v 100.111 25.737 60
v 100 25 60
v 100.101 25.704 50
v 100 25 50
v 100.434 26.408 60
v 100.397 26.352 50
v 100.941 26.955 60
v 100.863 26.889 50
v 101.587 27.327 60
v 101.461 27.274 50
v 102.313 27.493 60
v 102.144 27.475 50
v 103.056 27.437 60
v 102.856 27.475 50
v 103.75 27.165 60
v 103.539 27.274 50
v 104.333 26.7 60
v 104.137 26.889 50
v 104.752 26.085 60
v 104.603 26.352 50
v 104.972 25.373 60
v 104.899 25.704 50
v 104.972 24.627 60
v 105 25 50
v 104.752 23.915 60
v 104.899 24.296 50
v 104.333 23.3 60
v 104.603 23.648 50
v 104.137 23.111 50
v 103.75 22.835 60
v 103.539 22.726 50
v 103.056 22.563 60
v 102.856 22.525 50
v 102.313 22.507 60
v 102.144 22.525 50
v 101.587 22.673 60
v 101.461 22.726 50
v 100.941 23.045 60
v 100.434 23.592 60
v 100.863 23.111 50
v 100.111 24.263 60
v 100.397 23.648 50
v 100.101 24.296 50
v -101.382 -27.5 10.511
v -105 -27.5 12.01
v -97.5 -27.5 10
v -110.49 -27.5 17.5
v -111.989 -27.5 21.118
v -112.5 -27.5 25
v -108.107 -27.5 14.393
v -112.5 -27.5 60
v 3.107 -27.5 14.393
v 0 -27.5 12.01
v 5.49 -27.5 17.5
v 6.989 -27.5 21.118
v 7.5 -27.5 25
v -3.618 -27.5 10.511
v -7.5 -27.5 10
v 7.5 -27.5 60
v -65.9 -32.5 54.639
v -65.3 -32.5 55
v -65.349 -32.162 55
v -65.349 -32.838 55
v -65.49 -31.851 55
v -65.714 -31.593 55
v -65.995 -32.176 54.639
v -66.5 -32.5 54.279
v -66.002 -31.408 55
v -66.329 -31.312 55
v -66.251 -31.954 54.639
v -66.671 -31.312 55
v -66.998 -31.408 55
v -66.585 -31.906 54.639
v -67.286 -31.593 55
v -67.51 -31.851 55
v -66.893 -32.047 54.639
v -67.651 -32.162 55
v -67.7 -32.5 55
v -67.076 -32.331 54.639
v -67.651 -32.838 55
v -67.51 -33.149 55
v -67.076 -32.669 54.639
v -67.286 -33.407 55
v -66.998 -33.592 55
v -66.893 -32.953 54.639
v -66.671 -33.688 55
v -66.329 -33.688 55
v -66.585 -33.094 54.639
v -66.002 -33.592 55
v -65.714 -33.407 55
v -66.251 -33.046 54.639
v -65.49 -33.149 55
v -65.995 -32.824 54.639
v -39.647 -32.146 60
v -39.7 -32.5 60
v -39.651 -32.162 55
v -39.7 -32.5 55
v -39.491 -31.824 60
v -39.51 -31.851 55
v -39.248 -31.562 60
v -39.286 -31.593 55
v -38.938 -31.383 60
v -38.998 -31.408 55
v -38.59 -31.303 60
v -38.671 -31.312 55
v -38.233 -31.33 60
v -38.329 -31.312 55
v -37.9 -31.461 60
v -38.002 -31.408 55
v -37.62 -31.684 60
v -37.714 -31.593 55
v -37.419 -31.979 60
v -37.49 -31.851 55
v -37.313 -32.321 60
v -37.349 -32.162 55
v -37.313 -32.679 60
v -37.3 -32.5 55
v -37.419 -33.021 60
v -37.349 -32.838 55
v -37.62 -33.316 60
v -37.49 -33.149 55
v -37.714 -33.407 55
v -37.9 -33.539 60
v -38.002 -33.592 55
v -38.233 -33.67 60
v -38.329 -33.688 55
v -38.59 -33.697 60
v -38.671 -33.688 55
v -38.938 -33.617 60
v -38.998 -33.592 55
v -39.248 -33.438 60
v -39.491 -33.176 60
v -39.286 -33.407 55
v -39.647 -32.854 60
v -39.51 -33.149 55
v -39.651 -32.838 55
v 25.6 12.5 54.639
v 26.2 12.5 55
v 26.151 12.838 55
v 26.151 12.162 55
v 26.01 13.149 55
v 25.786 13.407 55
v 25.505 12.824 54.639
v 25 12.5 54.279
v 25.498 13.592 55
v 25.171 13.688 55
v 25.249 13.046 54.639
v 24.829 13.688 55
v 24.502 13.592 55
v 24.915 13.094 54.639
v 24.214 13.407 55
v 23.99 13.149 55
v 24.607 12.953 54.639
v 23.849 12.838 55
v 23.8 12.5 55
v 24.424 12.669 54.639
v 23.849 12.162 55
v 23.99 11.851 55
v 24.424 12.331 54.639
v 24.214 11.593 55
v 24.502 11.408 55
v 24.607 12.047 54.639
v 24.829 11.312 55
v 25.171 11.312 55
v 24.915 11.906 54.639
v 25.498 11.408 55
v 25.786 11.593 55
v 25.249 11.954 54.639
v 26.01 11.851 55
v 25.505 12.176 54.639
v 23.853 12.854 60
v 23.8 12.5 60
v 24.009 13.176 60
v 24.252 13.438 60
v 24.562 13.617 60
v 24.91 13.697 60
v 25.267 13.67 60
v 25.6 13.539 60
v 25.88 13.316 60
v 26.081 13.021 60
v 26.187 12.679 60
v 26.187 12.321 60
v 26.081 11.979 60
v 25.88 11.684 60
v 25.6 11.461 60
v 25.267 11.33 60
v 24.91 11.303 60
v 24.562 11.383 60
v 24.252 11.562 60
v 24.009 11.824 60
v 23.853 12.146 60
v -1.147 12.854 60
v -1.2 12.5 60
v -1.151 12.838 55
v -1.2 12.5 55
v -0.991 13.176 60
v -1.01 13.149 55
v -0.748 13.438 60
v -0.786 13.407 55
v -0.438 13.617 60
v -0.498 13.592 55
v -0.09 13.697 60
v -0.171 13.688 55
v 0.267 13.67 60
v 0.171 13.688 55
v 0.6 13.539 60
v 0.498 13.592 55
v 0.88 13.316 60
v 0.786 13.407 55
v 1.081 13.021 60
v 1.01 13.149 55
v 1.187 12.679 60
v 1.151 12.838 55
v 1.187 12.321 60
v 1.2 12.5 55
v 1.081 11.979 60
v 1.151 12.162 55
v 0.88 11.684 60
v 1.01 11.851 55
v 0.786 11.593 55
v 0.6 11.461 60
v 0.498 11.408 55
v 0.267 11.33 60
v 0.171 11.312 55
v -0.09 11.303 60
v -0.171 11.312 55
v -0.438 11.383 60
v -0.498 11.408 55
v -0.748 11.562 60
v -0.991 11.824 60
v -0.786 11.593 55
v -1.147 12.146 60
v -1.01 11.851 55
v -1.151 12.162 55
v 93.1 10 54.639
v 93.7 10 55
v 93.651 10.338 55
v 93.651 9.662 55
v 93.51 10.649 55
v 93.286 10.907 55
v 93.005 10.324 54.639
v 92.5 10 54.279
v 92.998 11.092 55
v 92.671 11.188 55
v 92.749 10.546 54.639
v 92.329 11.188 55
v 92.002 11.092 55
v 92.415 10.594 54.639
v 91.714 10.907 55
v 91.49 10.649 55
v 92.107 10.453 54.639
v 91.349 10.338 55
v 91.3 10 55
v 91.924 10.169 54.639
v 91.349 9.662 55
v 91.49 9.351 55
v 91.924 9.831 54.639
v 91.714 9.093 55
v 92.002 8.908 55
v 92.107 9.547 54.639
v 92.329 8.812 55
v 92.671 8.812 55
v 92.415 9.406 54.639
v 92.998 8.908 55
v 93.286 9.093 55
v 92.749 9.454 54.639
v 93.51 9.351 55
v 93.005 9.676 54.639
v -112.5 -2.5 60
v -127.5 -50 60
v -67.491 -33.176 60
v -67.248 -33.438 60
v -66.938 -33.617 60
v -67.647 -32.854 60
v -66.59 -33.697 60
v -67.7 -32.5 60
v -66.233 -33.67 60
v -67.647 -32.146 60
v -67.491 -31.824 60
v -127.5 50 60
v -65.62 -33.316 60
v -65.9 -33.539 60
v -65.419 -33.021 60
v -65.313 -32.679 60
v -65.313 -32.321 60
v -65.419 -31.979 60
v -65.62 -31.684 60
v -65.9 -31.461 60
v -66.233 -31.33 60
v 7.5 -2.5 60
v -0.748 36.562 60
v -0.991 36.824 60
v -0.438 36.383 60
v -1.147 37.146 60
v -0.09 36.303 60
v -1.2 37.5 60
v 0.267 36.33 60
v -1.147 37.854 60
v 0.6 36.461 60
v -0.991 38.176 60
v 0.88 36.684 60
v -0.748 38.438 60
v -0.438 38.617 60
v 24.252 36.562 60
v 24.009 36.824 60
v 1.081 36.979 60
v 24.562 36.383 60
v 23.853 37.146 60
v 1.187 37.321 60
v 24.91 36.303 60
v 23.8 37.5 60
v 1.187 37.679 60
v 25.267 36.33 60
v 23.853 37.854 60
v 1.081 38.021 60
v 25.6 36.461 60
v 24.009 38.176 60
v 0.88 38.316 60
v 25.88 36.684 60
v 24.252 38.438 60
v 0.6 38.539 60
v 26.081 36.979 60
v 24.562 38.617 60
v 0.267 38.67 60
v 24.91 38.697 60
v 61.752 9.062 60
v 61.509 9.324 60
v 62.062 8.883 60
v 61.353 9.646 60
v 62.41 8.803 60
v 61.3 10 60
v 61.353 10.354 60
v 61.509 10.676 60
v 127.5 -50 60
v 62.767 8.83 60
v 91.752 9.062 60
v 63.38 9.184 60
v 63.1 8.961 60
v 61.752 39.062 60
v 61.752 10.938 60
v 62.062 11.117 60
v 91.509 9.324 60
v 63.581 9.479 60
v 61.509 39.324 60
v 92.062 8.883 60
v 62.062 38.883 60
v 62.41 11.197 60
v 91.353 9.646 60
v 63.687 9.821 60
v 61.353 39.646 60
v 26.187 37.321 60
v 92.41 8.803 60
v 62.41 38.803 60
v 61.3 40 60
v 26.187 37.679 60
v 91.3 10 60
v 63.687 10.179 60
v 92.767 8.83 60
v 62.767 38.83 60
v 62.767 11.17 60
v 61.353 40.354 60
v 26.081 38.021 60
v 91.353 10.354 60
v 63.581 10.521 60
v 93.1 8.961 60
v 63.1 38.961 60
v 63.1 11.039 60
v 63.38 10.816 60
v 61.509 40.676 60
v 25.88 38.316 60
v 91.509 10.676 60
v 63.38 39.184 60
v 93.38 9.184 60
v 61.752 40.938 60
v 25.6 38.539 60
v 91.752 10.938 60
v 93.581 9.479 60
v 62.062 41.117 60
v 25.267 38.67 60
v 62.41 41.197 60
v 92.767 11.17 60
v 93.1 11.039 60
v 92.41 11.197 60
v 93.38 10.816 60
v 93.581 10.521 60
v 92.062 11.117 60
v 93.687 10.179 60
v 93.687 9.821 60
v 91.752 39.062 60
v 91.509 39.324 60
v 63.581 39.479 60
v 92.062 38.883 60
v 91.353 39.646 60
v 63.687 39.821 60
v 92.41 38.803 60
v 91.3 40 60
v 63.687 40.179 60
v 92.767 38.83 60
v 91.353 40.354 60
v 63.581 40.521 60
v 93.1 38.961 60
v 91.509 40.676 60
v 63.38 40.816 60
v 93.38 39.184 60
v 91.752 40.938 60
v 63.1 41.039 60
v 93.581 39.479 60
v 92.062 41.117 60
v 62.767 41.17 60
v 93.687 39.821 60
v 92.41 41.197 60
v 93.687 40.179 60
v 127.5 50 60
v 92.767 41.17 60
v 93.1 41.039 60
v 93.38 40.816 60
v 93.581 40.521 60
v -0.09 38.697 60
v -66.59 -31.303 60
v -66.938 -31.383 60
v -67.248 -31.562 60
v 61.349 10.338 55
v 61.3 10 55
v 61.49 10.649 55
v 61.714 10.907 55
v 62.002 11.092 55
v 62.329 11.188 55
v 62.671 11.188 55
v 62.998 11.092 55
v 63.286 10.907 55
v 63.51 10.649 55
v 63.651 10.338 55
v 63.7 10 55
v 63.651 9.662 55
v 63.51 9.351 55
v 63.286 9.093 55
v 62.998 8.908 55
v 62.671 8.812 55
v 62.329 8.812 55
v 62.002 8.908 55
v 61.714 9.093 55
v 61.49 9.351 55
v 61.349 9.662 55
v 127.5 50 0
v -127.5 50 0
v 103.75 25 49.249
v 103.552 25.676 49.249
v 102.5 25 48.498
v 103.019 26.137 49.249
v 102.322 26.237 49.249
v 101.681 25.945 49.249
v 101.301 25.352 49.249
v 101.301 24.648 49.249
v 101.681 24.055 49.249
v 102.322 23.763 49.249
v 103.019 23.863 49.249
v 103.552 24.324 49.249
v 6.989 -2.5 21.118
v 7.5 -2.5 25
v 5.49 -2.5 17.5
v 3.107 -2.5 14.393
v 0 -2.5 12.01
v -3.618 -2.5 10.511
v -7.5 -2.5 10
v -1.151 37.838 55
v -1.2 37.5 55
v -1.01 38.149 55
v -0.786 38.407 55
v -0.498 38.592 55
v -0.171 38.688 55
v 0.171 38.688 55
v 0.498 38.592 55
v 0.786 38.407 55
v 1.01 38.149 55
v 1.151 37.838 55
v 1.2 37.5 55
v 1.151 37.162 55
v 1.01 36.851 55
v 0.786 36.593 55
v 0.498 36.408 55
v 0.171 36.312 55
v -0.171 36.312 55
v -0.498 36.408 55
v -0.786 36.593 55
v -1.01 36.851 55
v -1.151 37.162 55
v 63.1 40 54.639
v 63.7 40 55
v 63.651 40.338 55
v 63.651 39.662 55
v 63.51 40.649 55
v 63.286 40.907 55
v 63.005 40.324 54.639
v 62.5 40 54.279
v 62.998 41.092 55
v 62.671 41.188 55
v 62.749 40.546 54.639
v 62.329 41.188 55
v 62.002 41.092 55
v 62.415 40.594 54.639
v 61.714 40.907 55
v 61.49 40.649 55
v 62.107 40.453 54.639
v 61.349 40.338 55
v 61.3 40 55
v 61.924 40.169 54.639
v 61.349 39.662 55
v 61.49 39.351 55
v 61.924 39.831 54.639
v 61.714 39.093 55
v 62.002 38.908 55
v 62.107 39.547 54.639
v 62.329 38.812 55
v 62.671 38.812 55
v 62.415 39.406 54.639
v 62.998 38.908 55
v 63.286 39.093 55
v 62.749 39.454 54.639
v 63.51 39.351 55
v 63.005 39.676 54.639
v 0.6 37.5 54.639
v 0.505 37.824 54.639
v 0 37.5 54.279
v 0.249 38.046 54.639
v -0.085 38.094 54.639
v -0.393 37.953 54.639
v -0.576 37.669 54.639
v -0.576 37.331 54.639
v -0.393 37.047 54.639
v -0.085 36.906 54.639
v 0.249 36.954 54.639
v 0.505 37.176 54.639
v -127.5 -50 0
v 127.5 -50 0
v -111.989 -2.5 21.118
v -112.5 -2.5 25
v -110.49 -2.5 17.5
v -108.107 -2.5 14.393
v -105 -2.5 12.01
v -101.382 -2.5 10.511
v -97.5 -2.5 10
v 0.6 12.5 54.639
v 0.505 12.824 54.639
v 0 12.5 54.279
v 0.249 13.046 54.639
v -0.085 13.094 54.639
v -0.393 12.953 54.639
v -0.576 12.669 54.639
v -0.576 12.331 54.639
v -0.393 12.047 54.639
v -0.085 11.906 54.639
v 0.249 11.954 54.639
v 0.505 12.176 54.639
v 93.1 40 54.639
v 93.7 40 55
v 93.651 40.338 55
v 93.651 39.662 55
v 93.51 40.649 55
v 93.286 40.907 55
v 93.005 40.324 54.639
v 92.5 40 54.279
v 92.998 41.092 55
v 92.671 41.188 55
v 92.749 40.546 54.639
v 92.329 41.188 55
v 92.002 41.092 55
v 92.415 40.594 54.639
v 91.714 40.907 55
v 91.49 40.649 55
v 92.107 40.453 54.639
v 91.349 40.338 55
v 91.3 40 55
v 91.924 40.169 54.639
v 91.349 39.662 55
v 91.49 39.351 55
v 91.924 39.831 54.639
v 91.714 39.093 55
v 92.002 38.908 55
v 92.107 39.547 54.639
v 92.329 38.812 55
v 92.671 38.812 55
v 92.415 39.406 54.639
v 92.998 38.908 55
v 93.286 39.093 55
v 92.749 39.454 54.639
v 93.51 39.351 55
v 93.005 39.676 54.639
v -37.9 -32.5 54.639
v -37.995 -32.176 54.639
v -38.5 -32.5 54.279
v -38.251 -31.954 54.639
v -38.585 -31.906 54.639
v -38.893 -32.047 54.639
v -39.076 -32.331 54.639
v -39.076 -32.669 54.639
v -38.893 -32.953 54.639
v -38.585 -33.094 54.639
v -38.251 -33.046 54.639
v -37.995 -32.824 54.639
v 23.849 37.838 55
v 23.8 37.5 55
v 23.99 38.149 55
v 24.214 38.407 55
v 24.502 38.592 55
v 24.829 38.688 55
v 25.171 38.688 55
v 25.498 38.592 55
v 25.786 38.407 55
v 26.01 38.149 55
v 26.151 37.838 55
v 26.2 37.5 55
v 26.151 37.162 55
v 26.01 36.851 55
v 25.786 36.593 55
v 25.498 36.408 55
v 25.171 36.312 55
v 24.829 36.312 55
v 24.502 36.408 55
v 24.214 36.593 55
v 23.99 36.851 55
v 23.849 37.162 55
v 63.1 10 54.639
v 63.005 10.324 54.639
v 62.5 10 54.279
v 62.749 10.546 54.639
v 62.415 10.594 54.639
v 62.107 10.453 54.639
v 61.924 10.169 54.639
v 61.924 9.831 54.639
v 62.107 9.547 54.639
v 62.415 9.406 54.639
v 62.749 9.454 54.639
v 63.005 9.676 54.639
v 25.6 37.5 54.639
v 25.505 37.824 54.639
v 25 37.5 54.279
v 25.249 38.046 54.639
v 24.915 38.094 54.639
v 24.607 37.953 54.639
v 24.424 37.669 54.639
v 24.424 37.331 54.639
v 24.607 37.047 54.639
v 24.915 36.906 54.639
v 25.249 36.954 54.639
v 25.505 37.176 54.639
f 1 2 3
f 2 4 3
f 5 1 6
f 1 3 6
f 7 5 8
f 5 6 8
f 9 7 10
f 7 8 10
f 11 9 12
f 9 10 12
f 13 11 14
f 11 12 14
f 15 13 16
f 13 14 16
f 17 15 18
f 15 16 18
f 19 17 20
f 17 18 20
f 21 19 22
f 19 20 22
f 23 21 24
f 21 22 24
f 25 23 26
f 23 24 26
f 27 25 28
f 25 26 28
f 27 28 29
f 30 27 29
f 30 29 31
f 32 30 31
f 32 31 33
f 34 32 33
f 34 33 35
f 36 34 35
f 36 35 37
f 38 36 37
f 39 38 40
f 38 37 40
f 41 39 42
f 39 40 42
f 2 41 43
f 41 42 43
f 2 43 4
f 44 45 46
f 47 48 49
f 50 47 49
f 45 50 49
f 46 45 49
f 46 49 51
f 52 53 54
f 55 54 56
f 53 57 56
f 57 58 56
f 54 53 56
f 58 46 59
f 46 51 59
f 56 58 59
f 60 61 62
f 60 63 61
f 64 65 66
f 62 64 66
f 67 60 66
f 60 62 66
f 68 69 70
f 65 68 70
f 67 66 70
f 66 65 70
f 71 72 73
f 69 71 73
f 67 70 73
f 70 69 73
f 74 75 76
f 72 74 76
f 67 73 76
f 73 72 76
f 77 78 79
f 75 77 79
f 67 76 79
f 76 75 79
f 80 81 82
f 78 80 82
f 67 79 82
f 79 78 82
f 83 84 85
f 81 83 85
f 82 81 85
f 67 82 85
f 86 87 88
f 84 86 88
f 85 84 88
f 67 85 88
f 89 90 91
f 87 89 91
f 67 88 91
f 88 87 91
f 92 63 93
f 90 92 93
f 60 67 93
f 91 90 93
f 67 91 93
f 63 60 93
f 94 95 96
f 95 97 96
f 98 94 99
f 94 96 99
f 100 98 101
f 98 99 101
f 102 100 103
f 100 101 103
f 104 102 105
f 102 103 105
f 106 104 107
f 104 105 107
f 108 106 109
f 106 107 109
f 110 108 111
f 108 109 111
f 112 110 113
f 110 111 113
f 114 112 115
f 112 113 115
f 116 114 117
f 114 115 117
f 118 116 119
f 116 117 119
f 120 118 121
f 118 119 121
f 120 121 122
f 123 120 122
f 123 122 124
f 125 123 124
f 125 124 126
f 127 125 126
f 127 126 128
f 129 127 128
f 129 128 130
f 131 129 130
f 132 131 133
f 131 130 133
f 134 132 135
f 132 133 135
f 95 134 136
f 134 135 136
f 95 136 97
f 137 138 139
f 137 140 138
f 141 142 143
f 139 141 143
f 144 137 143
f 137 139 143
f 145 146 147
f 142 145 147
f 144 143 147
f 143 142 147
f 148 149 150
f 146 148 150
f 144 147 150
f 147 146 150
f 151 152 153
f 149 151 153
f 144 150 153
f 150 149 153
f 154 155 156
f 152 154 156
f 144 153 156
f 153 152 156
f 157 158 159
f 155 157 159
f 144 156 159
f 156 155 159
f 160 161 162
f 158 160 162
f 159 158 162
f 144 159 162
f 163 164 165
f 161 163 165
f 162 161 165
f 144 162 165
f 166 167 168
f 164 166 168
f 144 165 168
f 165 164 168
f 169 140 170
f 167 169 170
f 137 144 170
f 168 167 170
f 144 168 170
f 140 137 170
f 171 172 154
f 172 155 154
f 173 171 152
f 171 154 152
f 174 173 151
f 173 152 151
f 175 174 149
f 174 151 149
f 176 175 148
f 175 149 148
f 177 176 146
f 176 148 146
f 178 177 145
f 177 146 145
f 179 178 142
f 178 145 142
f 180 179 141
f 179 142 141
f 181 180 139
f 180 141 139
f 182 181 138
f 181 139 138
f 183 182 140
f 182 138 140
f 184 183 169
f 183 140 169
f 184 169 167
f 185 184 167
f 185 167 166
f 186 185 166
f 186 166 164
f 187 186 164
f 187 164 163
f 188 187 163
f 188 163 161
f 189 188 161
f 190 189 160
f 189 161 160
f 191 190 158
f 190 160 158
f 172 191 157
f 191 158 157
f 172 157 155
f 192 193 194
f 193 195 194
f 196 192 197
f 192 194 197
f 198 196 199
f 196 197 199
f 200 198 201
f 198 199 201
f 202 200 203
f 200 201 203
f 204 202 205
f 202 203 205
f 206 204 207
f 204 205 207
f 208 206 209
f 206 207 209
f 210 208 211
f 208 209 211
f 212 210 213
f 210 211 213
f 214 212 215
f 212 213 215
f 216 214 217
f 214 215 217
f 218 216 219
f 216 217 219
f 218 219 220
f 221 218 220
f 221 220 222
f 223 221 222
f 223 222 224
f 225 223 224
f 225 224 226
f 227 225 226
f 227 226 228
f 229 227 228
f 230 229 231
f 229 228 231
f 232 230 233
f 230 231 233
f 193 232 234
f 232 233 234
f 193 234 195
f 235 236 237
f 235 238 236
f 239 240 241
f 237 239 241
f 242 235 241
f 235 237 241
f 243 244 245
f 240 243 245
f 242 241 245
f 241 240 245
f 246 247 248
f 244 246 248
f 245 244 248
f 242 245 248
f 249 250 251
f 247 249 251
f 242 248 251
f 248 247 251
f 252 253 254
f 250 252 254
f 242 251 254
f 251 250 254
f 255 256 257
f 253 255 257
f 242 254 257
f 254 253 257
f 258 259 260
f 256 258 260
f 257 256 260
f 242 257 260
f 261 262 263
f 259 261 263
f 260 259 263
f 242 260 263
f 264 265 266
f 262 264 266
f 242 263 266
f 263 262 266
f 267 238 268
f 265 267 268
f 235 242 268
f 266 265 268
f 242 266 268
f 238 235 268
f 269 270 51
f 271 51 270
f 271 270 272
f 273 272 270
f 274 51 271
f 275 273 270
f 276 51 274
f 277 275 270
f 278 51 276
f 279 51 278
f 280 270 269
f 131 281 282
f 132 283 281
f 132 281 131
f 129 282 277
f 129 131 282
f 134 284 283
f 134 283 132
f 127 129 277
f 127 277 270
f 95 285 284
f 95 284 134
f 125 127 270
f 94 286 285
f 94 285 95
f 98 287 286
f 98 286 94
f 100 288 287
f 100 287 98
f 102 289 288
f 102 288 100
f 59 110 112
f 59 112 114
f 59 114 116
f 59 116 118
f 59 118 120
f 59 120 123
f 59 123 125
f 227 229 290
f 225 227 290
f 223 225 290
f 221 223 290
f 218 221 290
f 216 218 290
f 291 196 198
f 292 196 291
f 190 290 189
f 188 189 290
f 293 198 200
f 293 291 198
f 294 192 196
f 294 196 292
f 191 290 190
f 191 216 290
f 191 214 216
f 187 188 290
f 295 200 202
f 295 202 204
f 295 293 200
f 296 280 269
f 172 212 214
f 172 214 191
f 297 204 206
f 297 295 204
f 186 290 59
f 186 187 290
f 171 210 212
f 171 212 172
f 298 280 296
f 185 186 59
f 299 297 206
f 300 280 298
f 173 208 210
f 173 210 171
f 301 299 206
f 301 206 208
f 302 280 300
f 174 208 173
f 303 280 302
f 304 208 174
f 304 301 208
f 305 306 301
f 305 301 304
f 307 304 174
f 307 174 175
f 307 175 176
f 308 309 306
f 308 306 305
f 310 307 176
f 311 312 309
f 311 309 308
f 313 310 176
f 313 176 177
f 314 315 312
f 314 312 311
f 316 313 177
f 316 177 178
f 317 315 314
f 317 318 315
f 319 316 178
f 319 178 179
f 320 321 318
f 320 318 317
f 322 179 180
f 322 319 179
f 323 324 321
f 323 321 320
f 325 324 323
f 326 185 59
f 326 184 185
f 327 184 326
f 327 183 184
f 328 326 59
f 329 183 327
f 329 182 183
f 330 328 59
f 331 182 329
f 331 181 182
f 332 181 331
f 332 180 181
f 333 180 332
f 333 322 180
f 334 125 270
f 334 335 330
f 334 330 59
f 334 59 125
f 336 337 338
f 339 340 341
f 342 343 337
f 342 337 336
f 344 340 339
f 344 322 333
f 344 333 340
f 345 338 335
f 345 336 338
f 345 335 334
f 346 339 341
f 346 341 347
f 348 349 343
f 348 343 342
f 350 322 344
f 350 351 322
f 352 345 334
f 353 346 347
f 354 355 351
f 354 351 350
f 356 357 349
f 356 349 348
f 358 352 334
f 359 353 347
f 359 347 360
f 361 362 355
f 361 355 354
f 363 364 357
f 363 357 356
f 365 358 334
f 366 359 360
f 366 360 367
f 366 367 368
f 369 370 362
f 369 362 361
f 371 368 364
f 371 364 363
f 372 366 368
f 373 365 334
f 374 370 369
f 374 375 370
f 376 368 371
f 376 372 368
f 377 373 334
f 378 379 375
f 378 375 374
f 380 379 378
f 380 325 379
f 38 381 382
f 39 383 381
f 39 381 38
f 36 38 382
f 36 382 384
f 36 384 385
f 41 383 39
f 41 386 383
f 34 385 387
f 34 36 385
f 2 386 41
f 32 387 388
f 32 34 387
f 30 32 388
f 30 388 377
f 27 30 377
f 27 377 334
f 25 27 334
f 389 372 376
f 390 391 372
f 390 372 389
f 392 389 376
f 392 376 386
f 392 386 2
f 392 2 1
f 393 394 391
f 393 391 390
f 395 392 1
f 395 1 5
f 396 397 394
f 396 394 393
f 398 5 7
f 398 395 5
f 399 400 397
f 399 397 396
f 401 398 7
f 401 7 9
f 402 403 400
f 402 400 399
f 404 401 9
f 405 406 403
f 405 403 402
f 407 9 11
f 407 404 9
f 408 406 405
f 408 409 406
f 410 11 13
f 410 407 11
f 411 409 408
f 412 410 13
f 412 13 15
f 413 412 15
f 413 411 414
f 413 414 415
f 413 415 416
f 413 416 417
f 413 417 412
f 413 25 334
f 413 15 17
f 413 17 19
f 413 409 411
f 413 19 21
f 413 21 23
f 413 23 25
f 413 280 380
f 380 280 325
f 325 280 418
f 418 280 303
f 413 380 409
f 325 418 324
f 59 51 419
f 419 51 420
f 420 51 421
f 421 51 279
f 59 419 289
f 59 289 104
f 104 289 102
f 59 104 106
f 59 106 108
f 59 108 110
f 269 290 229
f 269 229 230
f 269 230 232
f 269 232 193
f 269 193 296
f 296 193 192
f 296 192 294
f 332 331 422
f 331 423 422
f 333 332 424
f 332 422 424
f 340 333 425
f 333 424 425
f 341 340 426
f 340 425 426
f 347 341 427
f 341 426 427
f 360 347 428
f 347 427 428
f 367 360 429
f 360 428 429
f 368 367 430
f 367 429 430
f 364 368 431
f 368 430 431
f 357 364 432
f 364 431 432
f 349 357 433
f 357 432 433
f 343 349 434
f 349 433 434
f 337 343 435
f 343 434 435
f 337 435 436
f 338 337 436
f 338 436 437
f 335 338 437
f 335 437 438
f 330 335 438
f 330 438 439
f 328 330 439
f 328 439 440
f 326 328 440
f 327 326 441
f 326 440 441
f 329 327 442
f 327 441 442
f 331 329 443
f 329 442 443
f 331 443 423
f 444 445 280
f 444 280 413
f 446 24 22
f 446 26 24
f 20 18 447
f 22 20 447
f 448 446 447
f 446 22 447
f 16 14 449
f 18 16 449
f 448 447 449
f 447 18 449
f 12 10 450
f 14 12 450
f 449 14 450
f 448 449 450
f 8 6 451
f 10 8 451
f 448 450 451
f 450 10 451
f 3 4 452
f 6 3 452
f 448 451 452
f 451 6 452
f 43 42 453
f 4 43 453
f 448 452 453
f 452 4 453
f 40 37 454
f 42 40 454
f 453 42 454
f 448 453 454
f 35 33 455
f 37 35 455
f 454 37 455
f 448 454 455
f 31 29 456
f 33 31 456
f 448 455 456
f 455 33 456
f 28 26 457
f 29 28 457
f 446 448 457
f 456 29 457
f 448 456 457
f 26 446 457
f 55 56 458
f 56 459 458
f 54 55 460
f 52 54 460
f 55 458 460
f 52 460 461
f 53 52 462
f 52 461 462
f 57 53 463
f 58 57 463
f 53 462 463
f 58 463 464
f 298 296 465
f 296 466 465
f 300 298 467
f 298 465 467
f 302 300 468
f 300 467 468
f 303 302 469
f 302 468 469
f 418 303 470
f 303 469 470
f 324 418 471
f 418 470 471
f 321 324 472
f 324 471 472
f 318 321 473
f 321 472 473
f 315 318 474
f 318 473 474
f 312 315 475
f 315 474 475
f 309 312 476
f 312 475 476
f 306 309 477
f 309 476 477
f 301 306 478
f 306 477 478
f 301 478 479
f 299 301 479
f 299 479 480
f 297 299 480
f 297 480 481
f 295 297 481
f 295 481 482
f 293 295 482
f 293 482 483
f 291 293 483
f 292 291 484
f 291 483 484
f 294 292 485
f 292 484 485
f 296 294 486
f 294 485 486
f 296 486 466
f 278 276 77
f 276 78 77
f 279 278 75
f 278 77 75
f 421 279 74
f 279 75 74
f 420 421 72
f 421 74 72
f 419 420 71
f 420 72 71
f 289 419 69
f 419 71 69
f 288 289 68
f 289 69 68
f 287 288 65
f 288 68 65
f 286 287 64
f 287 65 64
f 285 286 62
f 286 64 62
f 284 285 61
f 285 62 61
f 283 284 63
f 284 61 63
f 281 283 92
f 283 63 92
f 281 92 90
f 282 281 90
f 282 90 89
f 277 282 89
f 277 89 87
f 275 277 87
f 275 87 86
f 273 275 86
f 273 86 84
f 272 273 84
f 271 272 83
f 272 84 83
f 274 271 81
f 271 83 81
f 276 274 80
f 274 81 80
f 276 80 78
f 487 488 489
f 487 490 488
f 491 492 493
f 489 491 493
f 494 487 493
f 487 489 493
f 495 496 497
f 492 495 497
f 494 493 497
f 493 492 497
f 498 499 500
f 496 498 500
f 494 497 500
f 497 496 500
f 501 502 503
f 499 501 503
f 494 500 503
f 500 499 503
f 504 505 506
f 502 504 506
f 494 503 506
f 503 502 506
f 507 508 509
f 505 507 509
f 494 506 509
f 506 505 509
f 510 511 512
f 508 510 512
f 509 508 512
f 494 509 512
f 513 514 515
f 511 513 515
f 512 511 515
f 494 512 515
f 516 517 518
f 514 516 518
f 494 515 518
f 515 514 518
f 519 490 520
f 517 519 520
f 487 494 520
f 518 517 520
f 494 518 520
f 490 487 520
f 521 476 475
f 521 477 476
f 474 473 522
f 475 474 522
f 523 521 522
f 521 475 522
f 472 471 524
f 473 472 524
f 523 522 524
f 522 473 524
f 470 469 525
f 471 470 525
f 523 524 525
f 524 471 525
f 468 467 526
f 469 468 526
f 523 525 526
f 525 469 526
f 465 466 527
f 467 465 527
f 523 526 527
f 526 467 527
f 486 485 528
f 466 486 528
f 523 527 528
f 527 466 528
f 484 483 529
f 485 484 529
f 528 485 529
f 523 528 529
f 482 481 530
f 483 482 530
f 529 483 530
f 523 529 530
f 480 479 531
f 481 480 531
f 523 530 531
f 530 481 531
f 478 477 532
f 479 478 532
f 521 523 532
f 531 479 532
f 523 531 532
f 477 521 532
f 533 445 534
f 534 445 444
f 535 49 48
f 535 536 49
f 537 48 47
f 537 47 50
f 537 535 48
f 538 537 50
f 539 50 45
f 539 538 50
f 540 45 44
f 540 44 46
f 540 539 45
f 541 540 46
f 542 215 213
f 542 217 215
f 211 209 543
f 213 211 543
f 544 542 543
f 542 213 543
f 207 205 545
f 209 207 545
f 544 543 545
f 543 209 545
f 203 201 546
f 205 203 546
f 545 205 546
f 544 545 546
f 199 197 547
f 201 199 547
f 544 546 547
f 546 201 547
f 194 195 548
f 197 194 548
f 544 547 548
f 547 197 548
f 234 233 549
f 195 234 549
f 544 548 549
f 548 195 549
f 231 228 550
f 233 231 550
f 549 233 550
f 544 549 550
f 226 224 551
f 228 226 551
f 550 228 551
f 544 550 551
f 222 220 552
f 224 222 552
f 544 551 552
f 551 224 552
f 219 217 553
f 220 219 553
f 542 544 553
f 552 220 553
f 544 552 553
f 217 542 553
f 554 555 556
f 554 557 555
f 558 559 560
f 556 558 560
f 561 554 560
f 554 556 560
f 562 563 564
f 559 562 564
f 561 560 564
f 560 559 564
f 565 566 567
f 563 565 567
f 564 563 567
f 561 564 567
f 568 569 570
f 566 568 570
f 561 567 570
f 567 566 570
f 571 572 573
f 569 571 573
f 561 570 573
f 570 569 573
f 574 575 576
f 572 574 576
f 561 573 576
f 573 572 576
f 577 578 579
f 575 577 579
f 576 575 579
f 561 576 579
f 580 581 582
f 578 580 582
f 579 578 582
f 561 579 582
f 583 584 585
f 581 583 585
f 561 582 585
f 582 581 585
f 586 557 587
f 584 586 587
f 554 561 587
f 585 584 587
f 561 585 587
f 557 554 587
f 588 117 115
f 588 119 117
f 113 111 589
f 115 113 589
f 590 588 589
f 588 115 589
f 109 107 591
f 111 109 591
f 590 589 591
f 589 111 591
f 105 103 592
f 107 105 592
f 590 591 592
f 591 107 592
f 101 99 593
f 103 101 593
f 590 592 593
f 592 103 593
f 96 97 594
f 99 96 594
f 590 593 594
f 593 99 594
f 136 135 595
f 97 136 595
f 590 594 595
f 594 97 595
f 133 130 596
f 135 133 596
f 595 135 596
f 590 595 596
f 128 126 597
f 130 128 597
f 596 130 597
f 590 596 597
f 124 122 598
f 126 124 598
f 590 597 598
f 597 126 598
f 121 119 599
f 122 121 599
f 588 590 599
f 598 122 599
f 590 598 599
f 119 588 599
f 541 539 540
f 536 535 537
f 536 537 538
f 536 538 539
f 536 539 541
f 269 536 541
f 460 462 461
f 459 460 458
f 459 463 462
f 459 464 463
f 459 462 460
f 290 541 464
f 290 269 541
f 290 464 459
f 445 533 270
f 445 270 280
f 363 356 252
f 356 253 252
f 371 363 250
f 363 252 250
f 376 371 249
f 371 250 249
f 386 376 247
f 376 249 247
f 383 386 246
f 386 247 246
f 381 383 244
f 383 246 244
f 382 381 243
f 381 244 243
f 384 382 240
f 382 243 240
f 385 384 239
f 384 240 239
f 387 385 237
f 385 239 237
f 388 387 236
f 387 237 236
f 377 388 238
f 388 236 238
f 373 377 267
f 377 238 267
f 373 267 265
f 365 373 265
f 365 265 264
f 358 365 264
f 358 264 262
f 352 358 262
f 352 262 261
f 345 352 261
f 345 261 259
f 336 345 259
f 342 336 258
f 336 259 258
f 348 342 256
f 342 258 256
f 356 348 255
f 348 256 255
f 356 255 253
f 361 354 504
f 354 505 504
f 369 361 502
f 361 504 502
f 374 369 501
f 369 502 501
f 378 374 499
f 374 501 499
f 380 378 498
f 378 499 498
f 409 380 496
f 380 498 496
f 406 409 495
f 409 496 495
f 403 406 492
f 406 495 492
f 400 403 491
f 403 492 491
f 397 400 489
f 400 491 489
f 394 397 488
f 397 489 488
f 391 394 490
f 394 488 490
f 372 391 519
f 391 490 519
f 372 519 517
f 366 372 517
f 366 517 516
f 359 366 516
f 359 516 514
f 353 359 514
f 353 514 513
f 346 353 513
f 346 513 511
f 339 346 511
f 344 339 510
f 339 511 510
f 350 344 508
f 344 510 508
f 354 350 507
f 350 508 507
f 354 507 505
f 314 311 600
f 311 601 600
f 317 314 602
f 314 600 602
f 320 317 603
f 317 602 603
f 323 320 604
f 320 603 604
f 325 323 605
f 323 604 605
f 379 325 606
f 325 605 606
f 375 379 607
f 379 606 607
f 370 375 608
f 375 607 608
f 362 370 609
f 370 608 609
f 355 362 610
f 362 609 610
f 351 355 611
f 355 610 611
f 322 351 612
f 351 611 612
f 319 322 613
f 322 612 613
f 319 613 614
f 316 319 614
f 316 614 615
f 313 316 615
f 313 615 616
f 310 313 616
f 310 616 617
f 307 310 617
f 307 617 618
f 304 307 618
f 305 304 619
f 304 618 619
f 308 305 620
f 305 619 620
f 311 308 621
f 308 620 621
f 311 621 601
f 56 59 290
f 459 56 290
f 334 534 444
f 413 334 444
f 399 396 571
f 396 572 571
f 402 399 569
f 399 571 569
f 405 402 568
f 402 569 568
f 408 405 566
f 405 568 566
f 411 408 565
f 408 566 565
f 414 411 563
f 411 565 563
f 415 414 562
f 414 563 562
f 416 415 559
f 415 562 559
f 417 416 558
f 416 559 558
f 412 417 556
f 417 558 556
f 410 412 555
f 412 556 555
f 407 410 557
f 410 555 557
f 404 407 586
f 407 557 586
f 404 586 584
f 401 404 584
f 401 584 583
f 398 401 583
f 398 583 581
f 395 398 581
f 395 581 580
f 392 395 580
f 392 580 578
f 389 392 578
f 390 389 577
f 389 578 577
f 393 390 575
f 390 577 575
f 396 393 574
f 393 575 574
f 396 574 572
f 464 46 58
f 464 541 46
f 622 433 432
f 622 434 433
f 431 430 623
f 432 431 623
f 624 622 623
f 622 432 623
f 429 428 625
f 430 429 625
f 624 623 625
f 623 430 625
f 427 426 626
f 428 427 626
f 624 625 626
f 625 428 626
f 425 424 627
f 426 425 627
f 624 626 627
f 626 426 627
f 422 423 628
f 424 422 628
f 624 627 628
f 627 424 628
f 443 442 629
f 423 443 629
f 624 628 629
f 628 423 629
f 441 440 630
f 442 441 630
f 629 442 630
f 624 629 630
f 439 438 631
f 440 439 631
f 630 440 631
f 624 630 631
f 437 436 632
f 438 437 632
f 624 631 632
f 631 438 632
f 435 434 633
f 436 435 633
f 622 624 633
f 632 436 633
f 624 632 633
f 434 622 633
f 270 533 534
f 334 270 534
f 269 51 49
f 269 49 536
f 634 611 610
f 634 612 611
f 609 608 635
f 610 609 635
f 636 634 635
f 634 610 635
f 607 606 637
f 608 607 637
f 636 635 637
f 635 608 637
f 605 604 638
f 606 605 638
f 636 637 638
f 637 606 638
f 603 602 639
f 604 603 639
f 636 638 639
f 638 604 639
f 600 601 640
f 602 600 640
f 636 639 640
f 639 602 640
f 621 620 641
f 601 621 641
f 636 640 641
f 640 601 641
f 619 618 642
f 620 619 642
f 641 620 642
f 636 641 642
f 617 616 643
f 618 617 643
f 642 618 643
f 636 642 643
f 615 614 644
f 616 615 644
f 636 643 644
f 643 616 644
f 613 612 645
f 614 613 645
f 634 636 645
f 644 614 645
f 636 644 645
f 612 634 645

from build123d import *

# Parameters (mm, degrees)
F0_W     = 255
F0_H     = 100
F1_DEPTH = 60
F2_W     = 120
F2_H     = 25
F3_DEPTH = 50
F4_R     = 15
F6_D     = 2.4
F6_DEPTH = 5
F6_TIP   = 0.7210327428
F7_D     = 5
F7_DEPTH = 10
F7_TIP   = 1.5021515476


with BuildPart() as f1:
    # F0 (on Top) → F1 (new body)
    with BuildSketch(Plane.XY):
        Rectangle(F0_W, F0_H)
    extrude(amount=F1_DEPTH)

    # F2 (on face) → F3 (cut)
    with BuildSketch(Plane.XY.offset(60)):
        with Locations((-52.5, -15)):
            Rectangle(F2_W, F2_H)
    extrude(amount=-F3_DEPTH, mode=Mode.SUBTRACT)

    # F4
    f4_edges = [f1.edges().sort_by_distance(p)[0] for p in [
        (7.5, -15, 10),
        (-112.5, -15, 10),
    ]]
    fillet(f4_edges, radius=F4_R)

    # F6
    with Locations(Plane.XY.offset(60)):
        with Locations((92.5, 10), (92.5, 40), (62.5, 10), (62.5, 40), (25, 12.5), (0, 12.5), (0, 37.5), (25, 37.5), (-38.5, -32.5), (-66.5, -32.5)):
            Hole(F6_D / 2, depth=F6_DEPTH)
            with Locations((0, 0, -(F6_DEPTH + F6_TIP / 2))):  # 118° drill point
                Cone(0, F6_D / 2, F6_TIP, mode=Mode.SUBTRACT)

    # F7
    with Locations(Plane.XY.offset(60)):
        with Locations((102.5, 25)):
            Hole(F7_D / 2, depth=F7_DEPTH)
            with Locations((0, 0, -(F7_DEPTH + F7_TIP / 2))):  # 118° drill point
                Cone(0, F7_D / 2, F7_TIP, mode=Mode.SUBTRACT)


solid = f1.part
